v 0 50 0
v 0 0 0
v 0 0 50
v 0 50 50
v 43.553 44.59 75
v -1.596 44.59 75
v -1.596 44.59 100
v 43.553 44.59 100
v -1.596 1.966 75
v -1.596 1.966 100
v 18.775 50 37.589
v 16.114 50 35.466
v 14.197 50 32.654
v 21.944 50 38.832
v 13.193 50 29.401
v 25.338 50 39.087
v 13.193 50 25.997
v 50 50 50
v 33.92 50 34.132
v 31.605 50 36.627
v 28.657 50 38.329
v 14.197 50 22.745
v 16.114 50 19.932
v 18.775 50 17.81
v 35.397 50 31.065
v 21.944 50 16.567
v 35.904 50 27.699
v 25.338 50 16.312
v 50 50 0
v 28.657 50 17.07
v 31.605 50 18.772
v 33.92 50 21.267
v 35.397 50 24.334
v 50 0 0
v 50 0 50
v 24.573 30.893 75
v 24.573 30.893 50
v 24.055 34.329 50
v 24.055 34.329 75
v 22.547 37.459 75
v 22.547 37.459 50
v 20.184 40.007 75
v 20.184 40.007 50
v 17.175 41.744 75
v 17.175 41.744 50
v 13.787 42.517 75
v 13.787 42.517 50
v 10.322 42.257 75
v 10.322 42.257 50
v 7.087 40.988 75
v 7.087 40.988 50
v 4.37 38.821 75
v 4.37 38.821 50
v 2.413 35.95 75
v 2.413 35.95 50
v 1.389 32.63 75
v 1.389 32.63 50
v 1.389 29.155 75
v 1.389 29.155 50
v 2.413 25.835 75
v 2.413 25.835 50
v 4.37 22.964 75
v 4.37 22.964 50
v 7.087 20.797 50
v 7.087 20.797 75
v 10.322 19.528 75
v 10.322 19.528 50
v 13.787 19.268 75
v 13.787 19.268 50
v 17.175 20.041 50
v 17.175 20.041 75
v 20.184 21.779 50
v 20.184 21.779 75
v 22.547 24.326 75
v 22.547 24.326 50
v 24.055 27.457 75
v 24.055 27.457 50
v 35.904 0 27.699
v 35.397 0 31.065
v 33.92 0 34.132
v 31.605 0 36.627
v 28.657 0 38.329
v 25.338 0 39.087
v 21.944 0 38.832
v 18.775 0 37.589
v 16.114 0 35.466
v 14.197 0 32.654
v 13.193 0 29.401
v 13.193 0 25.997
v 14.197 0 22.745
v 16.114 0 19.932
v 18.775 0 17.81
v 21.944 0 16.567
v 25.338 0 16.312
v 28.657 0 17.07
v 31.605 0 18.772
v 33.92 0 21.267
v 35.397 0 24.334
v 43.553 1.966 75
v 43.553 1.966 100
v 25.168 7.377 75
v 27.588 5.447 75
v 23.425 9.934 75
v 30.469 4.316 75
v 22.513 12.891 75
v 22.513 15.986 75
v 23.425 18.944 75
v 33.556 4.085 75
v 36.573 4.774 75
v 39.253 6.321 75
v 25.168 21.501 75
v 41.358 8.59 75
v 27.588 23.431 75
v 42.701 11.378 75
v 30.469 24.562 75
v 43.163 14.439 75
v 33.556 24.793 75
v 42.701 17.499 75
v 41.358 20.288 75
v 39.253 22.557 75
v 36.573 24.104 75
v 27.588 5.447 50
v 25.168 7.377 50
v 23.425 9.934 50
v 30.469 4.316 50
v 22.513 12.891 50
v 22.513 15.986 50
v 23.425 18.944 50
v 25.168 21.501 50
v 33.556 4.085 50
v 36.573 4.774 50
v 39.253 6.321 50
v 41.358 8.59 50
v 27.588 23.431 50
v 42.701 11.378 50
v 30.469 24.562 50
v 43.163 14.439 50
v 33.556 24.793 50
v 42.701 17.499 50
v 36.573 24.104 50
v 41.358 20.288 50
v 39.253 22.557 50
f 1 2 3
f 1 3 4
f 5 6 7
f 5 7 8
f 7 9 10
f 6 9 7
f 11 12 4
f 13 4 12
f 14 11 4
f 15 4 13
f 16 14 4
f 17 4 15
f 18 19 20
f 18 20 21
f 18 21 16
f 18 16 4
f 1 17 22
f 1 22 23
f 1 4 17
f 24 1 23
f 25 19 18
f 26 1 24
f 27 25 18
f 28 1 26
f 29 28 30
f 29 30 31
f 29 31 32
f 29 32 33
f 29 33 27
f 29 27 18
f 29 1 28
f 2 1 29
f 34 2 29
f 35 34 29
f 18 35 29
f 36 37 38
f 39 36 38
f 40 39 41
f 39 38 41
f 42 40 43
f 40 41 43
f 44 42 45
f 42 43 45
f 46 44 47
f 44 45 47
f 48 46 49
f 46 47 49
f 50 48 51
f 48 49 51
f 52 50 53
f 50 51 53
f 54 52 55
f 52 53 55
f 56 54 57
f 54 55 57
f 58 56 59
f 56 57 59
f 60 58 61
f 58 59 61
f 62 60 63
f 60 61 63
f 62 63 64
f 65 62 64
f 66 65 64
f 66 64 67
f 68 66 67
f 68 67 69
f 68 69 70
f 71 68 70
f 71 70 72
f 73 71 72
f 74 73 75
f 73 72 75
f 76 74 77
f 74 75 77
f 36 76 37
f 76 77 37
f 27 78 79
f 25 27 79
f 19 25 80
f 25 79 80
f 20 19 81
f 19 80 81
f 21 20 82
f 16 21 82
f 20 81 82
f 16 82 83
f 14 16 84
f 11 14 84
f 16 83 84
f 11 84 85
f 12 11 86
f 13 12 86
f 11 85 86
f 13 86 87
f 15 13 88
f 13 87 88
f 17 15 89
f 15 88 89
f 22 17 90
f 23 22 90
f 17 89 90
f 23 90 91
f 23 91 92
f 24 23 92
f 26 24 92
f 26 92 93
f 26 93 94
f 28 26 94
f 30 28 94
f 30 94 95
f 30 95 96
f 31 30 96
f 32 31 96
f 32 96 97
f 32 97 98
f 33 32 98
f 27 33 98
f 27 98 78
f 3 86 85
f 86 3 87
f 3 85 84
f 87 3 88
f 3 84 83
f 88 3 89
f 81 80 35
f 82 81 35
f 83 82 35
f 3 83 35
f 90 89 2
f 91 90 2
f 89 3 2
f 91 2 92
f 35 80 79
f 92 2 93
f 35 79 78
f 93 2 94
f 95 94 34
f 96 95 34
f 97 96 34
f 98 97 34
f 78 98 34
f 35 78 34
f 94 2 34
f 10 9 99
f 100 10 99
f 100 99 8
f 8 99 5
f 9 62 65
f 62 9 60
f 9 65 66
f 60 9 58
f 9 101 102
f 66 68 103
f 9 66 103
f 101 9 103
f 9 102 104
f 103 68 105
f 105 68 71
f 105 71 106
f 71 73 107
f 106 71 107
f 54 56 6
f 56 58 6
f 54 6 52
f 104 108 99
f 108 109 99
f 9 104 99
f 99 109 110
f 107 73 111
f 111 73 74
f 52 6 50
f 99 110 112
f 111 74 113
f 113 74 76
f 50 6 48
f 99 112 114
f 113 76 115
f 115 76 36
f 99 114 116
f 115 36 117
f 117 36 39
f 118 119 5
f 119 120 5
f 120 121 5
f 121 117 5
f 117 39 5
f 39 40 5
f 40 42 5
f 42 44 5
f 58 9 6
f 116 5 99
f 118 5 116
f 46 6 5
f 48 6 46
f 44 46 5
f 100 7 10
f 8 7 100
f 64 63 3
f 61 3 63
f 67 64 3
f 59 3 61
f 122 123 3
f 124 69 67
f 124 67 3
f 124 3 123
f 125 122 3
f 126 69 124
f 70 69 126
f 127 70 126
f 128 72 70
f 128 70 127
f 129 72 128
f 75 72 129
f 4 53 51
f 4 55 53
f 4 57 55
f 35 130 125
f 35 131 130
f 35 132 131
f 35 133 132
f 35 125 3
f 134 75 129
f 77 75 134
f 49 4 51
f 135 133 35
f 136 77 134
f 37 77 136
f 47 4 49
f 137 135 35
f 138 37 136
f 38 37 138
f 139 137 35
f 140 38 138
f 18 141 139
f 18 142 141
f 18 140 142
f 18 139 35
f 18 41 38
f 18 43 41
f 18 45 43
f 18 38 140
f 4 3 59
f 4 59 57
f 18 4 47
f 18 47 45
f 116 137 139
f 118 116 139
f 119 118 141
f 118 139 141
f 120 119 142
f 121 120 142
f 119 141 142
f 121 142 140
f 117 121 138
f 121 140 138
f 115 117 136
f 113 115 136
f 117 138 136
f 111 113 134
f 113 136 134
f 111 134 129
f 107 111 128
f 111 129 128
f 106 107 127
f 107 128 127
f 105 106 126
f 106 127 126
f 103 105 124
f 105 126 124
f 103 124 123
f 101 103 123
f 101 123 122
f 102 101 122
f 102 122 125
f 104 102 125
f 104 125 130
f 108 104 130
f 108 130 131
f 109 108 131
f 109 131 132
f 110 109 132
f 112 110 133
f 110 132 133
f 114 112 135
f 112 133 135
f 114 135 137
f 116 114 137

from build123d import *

# Parameters (mm, degrees)
F0_W     = 50
F0_H     = 50
F1_DEPTH = 50
F2_R     = 11.6571142063
F3_DEPTH = 25
F4_R     = 10.382921487
F5_DEPTH = 25
F6_W     = 45.1483903453
F6_H     = 42.6243015099
F6_R     = 10.382921487
F7_DEPTH = 25
F8_R     = 11.4191364722
F9_DEPTH = 162


with BuildPart() as f1:
    # F0 (on Top) → F1 (new body)
    with BuildSketch(Plane.XY):
        with Locations((25, 25)):
            Rectangle(F0_W, F0_H)
    extrude(amount=F1_DEPTH)

    # F2 (on face) → F3 (join)
    with BuildSketch(Plane.XY.offset(50)):
        with Locations((12.9157425836, 30.8926273137)):
            Circle(F2_R)
    extrude(amount=F3_DEPTH)

    # F4 (on face) → F5 (join)
    with BuildSketch(Plane.XY.offset(50)):
        with Locations((32.7795855701, 14.4389113411)):
            Circle(F4_R)
    extrude(amount=F5_DEPTH)

    # F6 (on face) → F7 (join)
    with BuildSketch(Plane.XY.offset(75)):
        with Locations((20.978460554, 23.2780914521)):
            Rectangle(F6_W, F6_H)
        with Locations((32.7795855701, 14.4389113411)):
            Circle(F6_R, mode=Mode.SUBTRACT)
        with Locations((32.7795855701, 14.4389113411)):
            Circle(F6_R)
    extrude(amount=F7_DEPTH)

    # F8 (on face) → F9 (cut)
    with BuildSketch(Plane.XZ):
        with Locations((24.4850087911, 27.6993848383)):
            Circle(F8_R)
    extrude(amount=-F9_DEPTH, mode=Mode.SUBTRACT)


solid = f1.part
